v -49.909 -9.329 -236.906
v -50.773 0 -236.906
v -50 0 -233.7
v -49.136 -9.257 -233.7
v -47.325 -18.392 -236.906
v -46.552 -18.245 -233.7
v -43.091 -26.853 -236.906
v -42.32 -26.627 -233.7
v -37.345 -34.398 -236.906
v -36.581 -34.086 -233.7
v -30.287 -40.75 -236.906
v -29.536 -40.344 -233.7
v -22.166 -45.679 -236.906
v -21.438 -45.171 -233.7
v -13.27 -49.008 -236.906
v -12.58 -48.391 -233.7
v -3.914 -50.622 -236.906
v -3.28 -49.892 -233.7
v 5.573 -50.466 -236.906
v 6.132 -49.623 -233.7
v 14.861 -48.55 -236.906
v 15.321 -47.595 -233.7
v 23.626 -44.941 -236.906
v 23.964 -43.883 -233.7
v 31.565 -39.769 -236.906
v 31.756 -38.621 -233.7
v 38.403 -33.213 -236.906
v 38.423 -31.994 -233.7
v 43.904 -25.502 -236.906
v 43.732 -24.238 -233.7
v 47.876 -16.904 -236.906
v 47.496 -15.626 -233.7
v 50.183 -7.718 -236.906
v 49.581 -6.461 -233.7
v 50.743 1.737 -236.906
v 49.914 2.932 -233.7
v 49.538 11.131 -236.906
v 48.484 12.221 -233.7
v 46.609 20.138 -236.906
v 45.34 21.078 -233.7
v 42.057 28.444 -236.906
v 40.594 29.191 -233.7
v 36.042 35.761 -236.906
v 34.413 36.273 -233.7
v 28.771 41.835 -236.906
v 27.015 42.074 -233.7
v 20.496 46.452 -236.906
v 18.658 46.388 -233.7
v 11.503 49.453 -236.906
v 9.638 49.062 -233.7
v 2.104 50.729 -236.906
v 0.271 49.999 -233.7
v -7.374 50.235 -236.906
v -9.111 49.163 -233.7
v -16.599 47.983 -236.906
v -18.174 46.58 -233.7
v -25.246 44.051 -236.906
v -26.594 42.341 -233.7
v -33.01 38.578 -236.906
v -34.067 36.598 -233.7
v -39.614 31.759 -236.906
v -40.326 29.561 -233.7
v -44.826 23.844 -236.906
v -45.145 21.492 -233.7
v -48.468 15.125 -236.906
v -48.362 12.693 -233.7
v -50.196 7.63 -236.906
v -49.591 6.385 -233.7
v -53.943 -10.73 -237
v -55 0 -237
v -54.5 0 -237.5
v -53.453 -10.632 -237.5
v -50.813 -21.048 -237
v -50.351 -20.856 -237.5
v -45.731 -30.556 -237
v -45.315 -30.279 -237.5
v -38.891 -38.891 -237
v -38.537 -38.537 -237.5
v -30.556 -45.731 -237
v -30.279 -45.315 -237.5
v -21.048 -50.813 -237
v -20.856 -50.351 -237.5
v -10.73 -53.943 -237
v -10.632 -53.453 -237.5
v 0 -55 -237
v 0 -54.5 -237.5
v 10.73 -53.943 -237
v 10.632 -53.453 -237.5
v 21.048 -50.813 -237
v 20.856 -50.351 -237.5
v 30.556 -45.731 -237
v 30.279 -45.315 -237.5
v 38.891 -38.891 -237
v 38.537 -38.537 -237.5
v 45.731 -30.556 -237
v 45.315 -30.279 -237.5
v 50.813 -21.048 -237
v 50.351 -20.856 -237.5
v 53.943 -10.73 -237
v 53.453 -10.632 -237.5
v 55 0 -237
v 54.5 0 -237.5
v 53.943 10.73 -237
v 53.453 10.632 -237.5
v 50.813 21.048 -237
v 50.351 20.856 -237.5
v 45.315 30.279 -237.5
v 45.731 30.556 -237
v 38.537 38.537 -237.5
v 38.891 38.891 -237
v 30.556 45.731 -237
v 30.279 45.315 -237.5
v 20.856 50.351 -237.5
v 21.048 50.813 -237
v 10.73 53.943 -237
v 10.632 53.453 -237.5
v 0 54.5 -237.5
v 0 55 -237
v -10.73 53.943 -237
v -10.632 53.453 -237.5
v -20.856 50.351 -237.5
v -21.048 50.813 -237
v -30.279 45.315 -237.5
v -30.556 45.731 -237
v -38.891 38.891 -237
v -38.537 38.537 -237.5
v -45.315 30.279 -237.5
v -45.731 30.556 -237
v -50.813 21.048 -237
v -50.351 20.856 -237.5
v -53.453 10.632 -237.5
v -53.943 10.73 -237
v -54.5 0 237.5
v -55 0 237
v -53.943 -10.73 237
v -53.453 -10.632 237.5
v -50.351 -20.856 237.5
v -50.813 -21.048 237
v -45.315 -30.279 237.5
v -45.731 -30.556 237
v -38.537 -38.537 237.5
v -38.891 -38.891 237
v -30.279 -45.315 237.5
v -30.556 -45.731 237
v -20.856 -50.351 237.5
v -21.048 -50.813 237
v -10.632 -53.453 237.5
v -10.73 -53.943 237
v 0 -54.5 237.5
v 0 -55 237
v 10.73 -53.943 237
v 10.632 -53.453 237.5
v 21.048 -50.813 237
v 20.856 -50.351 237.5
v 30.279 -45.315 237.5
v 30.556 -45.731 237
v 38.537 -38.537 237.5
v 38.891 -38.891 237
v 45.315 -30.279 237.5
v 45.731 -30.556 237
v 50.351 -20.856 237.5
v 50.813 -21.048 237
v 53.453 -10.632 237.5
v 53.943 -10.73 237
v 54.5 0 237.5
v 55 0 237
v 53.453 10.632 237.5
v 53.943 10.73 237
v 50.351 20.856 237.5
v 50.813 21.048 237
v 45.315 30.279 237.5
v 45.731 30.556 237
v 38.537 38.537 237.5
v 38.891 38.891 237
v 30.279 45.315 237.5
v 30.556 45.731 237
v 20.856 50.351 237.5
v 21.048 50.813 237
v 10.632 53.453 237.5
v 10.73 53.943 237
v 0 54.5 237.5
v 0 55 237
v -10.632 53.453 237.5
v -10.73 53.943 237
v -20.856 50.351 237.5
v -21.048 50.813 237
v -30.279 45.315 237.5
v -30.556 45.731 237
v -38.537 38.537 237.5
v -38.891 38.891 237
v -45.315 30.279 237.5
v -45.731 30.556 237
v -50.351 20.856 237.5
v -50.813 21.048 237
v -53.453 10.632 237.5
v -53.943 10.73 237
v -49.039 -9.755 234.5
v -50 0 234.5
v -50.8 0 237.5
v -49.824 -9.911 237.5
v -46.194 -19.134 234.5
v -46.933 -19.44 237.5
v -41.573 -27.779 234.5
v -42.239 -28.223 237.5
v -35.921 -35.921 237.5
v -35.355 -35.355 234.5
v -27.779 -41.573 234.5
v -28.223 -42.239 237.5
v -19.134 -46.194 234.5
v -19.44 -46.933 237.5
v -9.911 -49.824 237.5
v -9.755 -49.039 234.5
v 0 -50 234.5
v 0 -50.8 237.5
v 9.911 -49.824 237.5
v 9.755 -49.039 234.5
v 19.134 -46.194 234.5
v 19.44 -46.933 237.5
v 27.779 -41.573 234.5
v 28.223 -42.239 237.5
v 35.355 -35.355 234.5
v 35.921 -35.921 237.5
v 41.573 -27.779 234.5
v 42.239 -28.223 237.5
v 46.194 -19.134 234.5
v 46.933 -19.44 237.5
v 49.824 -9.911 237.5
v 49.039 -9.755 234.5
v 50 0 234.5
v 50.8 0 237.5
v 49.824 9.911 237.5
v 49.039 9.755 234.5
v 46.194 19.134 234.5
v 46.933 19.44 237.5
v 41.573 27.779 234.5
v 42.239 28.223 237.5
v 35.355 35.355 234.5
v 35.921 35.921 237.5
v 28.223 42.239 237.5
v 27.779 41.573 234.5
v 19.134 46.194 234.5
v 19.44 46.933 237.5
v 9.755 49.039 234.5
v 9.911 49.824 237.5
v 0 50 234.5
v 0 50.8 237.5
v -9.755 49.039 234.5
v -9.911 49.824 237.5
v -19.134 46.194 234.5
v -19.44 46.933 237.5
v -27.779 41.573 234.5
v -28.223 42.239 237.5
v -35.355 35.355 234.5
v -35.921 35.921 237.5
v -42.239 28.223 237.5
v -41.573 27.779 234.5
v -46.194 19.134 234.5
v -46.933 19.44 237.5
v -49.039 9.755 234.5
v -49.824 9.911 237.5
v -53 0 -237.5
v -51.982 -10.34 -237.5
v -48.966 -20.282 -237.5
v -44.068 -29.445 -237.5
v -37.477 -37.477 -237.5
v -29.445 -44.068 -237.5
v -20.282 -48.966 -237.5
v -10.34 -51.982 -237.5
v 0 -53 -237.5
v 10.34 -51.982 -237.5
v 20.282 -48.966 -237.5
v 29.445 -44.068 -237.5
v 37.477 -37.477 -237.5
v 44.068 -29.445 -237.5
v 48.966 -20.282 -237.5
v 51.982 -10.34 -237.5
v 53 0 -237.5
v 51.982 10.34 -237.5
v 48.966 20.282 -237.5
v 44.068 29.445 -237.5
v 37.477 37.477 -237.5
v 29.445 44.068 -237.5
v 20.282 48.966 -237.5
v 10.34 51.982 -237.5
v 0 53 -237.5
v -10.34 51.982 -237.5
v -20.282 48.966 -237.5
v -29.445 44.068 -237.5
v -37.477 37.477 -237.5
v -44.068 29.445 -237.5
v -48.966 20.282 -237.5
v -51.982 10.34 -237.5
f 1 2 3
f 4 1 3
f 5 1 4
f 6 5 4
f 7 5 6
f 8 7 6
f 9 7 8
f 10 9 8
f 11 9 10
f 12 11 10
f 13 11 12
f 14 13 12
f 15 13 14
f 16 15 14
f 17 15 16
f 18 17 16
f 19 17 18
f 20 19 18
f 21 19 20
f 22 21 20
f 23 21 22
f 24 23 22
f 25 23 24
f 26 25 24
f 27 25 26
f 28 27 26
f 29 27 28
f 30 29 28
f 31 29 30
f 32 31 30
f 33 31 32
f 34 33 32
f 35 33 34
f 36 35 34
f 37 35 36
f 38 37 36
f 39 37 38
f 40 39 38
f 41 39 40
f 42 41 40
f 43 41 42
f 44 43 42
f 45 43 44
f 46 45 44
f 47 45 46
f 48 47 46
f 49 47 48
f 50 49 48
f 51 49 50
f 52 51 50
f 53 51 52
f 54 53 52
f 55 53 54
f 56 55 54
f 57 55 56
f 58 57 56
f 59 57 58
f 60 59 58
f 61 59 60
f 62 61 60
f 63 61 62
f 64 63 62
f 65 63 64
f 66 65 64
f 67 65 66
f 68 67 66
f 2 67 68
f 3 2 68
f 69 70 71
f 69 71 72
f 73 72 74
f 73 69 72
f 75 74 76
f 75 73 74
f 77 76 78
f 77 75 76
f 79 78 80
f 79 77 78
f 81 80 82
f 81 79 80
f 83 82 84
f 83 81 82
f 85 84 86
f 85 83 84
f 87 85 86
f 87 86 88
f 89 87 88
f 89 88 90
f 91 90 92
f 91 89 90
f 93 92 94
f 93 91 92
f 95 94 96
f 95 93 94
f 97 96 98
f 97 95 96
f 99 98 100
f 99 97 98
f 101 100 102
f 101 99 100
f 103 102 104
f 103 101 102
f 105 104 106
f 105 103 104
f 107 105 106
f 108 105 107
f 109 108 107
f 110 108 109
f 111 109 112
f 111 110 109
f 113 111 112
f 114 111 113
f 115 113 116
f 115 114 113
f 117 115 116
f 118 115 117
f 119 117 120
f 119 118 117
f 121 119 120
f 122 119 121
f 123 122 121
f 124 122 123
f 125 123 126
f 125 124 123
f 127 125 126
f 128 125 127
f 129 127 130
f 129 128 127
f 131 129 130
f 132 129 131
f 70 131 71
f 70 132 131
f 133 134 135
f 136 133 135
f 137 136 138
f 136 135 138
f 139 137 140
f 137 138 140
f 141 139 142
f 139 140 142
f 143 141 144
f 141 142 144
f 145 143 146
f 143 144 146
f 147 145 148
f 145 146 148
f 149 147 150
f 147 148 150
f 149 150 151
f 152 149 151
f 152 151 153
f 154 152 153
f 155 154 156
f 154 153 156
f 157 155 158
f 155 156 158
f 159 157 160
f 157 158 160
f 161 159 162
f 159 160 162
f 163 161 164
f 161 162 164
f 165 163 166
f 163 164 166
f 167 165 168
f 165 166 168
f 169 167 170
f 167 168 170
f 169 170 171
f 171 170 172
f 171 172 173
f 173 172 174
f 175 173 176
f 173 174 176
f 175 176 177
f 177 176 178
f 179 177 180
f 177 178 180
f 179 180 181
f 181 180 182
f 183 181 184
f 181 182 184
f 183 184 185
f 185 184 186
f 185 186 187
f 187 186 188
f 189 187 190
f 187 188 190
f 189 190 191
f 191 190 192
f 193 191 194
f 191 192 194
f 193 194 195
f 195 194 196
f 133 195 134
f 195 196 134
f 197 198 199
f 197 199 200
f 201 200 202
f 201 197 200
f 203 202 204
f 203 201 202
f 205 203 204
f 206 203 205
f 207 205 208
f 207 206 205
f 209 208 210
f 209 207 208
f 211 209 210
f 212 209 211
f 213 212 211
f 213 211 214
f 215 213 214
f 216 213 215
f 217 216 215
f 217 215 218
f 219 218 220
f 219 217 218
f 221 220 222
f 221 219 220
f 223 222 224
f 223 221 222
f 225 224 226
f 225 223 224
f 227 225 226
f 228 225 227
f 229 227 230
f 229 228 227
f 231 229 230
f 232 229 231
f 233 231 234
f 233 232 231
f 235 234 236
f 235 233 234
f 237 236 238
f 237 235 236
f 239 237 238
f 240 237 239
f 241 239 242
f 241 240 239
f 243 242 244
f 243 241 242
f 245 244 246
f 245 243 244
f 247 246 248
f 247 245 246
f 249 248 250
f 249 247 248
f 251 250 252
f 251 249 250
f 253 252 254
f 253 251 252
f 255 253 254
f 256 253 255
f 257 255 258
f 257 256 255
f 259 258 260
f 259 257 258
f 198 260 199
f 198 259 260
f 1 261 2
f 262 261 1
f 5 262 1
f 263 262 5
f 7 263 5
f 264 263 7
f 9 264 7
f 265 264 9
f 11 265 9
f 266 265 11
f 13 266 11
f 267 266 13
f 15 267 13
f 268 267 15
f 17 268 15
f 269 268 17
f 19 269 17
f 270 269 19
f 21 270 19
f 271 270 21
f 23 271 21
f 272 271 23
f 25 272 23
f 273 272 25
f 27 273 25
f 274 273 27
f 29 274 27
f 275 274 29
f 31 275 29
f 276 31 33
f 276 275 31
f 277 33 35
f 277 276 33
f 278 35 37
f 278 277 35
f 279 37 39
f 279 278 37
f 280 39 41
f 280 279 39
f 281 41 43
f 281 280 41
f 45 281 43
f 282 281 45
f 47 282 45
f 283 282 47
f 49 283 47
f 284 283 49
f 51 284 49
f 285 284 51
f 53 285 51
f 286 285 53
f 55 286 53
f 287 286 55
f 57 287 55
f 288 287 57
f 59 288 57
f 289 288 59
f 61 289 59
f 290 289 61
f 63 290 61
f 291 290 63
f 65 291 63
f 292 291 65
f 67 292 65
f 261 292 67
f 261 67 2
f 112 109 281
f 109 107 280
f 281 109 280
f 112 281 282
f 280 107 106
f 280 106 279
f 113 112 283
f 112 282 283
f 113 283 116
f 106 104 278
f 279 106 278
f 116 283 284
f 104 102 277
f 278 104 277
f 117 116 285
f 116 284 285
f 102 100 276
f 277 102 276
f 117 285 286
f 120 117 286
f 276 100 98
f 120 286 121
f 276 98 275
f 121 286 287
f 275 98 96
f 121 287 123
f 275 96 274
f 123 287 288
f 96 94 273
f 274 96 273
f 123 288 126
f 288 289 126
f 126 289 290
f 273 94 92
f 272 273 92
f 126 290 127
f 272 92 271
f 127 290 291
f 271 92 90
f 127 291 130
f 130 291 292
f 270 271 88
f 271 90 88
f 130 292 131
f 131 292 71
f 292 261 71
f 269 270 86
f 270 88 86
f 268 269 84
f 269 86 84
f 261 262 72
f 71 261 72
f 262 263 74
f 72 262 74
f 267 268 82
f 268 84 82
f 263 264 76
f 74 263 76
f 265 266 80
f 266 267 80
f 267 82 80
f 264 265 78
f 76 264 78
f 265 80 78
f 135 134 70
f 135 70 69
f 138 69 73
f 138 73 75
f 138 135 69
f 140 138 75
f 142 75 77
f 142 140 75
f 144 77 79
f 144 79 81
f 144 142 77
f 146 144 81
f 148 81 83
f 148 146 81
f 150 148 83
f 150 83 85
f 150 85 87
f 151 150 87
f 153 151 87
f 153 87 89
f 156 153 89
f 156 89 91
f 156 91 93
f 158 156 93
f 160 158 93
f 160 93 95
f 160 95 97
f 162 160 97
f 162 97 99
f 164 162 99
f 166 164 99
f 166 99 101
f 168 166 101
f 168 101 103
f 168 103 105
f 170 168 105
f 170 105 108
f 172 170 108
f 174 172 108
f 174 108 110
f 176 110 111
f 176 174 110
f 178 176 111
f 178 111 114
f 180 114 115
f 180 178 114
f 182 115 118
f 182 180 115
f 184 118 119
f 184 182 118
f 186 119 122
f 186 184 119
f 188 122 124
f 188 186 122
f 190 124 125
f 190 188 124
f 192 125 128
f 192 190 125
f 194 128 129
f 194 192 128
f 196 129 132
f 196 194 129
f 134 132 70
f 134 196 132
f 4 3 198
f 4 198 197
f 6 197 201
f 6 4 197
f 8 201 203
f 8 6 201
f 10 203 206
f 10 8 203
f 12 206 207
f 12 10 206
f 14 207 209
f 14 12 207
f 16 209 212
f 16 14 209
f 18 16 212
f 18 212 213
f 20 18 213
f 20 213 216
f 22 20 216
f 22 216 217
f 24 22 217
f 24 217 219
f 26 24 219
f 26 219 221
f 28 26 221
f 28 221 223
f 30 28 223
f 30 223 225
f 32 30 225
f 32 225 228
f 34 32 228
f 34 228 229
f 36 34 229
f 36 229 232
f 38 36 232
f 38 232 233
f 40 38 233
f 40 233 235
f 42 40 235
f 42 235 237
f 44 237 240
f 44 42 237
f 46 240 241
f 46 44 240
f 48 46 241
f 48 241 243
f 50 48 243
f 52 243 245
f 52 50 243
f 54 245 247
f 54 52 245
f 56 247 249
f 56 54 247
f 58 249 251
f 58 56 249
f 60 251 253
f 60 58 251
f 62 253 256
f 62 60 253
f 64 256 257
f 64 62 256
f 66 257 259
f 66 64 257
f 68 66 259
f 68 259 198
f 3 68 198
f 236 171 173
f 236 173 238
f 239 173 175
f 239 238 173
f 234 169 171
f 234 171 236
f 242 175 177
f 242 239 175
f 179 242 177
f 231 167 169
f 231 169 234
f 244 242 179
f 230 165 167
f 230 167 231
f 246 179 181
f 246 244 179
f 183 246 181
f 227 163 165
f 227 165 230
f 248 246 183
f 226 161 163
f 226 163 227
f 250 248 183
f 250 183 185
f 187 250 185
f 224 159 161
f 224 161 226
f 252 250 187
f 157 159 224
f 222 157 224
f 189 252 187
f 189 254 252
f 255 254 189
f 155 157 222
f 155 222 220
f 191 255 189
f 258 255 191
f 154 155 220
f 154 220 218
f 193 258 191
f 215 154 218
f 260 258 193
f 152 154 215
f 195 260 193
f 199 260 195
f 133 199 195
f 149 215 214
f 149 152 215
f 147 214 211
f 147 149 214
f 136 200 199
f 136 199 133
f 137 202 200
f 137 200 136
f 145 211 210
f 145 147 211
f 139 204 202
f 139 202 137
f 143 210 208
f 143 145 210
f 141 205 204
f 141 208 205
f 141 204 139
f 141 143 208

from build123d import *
from OCP.BRepFilletAPI import BRepFilletAPI_MakeChamfer

# Parameters (mm, degrees)
SKETCH1_R               = 55
SKETCH1_R_2             = 50
TUBE_BODY_DEPTH         = 237.5
BORESINK_LEADIN_SIZE    = 0.8
BORESINK_LEADIN_SIZE2   = 3
BORESINK_LEADIN_2_SIZE  = 0.8
BORESINK_LEADIN_2_SIZE2 = 3
OD_EDGE_BREAK_SIZE      = 0.5


with BuildPart() as part:
    # Sketch1 → Tube Body (new, symmetric)
    with BuildSketch(Plane.XY):
        with Locations(Location((0, 0, 0), (0, 0, 180))):
            Circle(SKETCH1_R)
        with Locations(Location((0, 0, 0), (0, 0, 180))):
            Circle(SKETCH1_R_2, mode=Mode.SUBTRACT)
    extrude(amount=TUBE_BODY_DEPTH, both=True)

    # Boresink_Leadin: one chamfer whose edges measure the first distance from different faces: ONE call of the kernel's chamfer builder (chamfer() names one face for all edges)
    boresink_leadin_edges_1 = [part.edges().sort_by_distance(p)[0] for p in [
        (50, 0, -237.5),
    ]]
    boresink_leadin_side_1 = [part.faces().sort_by_distance(p)[0] for p in [
        (50, 0, 0),
    ]]
    boresink_leadin_edges_2 = [part.edges().sort_by_distance(p)[0] for p in [
        (50, 0, 237.5),
    ]]
    boresink_leadin_side_2 = [part.faces().sort_by_distance(p)[0] for p in [
        (53.444365081, 0, 237.5),
    ]]
    boresink_leadin = BRepFilletAPI_MakeChamfer(part.part.solid().wrapped)
    for e in boresink_leadin_edges_1:
        boresink_leadin.Add(BORESINK_LEADIN_SIZE, BORESINK_LEADIN_SIZE2, e.wrapped, boresink_leadin_side_1[0].wrapped)  # the first distance lies on this face
    for e in boresink_leadin_edges_2:
        boresink_leadin.Add(BORESINK_LEADIN_SIZE, BORESINK_LEADIN_SIZE2, e.wrapped, boresink_leadin_side_2[0].wrapped)  # the first distance lies on this face
    add(Compound.cast(boresink_leadin.Shape()), mode=Mode.REPLACE)

    # Boresink_Leadin 2
    boresink_leadin_2_edges = [part.edges().sort_by_distance(p)[0] for p in [
        (50, 0, -236.7),
    ]]
    boresink_leadin_2_side = [part.faces().sort_by_distance(p)[0] for p in [
        (51.5, 0, -237.1),
    ]]
    chamfer(boresink_leadin_2_edges, length=BORESINK_LEADIN_2_SIZE, length2=BORESINK_LEADIN_2_SIZE2, reference=boresink_leadin_2_side[0])

    # OD_Edge_Break
    od_edge_break_edges = [part.edges().sort_by_distance(p)[0] for p in [
        (55, 0, -237.5),
        (55, 0, 237.5),
    ]]
    chamfer(od_edge_break_edges, length=OD_EDGE_BREAK_SIZE)


solid = part.part
